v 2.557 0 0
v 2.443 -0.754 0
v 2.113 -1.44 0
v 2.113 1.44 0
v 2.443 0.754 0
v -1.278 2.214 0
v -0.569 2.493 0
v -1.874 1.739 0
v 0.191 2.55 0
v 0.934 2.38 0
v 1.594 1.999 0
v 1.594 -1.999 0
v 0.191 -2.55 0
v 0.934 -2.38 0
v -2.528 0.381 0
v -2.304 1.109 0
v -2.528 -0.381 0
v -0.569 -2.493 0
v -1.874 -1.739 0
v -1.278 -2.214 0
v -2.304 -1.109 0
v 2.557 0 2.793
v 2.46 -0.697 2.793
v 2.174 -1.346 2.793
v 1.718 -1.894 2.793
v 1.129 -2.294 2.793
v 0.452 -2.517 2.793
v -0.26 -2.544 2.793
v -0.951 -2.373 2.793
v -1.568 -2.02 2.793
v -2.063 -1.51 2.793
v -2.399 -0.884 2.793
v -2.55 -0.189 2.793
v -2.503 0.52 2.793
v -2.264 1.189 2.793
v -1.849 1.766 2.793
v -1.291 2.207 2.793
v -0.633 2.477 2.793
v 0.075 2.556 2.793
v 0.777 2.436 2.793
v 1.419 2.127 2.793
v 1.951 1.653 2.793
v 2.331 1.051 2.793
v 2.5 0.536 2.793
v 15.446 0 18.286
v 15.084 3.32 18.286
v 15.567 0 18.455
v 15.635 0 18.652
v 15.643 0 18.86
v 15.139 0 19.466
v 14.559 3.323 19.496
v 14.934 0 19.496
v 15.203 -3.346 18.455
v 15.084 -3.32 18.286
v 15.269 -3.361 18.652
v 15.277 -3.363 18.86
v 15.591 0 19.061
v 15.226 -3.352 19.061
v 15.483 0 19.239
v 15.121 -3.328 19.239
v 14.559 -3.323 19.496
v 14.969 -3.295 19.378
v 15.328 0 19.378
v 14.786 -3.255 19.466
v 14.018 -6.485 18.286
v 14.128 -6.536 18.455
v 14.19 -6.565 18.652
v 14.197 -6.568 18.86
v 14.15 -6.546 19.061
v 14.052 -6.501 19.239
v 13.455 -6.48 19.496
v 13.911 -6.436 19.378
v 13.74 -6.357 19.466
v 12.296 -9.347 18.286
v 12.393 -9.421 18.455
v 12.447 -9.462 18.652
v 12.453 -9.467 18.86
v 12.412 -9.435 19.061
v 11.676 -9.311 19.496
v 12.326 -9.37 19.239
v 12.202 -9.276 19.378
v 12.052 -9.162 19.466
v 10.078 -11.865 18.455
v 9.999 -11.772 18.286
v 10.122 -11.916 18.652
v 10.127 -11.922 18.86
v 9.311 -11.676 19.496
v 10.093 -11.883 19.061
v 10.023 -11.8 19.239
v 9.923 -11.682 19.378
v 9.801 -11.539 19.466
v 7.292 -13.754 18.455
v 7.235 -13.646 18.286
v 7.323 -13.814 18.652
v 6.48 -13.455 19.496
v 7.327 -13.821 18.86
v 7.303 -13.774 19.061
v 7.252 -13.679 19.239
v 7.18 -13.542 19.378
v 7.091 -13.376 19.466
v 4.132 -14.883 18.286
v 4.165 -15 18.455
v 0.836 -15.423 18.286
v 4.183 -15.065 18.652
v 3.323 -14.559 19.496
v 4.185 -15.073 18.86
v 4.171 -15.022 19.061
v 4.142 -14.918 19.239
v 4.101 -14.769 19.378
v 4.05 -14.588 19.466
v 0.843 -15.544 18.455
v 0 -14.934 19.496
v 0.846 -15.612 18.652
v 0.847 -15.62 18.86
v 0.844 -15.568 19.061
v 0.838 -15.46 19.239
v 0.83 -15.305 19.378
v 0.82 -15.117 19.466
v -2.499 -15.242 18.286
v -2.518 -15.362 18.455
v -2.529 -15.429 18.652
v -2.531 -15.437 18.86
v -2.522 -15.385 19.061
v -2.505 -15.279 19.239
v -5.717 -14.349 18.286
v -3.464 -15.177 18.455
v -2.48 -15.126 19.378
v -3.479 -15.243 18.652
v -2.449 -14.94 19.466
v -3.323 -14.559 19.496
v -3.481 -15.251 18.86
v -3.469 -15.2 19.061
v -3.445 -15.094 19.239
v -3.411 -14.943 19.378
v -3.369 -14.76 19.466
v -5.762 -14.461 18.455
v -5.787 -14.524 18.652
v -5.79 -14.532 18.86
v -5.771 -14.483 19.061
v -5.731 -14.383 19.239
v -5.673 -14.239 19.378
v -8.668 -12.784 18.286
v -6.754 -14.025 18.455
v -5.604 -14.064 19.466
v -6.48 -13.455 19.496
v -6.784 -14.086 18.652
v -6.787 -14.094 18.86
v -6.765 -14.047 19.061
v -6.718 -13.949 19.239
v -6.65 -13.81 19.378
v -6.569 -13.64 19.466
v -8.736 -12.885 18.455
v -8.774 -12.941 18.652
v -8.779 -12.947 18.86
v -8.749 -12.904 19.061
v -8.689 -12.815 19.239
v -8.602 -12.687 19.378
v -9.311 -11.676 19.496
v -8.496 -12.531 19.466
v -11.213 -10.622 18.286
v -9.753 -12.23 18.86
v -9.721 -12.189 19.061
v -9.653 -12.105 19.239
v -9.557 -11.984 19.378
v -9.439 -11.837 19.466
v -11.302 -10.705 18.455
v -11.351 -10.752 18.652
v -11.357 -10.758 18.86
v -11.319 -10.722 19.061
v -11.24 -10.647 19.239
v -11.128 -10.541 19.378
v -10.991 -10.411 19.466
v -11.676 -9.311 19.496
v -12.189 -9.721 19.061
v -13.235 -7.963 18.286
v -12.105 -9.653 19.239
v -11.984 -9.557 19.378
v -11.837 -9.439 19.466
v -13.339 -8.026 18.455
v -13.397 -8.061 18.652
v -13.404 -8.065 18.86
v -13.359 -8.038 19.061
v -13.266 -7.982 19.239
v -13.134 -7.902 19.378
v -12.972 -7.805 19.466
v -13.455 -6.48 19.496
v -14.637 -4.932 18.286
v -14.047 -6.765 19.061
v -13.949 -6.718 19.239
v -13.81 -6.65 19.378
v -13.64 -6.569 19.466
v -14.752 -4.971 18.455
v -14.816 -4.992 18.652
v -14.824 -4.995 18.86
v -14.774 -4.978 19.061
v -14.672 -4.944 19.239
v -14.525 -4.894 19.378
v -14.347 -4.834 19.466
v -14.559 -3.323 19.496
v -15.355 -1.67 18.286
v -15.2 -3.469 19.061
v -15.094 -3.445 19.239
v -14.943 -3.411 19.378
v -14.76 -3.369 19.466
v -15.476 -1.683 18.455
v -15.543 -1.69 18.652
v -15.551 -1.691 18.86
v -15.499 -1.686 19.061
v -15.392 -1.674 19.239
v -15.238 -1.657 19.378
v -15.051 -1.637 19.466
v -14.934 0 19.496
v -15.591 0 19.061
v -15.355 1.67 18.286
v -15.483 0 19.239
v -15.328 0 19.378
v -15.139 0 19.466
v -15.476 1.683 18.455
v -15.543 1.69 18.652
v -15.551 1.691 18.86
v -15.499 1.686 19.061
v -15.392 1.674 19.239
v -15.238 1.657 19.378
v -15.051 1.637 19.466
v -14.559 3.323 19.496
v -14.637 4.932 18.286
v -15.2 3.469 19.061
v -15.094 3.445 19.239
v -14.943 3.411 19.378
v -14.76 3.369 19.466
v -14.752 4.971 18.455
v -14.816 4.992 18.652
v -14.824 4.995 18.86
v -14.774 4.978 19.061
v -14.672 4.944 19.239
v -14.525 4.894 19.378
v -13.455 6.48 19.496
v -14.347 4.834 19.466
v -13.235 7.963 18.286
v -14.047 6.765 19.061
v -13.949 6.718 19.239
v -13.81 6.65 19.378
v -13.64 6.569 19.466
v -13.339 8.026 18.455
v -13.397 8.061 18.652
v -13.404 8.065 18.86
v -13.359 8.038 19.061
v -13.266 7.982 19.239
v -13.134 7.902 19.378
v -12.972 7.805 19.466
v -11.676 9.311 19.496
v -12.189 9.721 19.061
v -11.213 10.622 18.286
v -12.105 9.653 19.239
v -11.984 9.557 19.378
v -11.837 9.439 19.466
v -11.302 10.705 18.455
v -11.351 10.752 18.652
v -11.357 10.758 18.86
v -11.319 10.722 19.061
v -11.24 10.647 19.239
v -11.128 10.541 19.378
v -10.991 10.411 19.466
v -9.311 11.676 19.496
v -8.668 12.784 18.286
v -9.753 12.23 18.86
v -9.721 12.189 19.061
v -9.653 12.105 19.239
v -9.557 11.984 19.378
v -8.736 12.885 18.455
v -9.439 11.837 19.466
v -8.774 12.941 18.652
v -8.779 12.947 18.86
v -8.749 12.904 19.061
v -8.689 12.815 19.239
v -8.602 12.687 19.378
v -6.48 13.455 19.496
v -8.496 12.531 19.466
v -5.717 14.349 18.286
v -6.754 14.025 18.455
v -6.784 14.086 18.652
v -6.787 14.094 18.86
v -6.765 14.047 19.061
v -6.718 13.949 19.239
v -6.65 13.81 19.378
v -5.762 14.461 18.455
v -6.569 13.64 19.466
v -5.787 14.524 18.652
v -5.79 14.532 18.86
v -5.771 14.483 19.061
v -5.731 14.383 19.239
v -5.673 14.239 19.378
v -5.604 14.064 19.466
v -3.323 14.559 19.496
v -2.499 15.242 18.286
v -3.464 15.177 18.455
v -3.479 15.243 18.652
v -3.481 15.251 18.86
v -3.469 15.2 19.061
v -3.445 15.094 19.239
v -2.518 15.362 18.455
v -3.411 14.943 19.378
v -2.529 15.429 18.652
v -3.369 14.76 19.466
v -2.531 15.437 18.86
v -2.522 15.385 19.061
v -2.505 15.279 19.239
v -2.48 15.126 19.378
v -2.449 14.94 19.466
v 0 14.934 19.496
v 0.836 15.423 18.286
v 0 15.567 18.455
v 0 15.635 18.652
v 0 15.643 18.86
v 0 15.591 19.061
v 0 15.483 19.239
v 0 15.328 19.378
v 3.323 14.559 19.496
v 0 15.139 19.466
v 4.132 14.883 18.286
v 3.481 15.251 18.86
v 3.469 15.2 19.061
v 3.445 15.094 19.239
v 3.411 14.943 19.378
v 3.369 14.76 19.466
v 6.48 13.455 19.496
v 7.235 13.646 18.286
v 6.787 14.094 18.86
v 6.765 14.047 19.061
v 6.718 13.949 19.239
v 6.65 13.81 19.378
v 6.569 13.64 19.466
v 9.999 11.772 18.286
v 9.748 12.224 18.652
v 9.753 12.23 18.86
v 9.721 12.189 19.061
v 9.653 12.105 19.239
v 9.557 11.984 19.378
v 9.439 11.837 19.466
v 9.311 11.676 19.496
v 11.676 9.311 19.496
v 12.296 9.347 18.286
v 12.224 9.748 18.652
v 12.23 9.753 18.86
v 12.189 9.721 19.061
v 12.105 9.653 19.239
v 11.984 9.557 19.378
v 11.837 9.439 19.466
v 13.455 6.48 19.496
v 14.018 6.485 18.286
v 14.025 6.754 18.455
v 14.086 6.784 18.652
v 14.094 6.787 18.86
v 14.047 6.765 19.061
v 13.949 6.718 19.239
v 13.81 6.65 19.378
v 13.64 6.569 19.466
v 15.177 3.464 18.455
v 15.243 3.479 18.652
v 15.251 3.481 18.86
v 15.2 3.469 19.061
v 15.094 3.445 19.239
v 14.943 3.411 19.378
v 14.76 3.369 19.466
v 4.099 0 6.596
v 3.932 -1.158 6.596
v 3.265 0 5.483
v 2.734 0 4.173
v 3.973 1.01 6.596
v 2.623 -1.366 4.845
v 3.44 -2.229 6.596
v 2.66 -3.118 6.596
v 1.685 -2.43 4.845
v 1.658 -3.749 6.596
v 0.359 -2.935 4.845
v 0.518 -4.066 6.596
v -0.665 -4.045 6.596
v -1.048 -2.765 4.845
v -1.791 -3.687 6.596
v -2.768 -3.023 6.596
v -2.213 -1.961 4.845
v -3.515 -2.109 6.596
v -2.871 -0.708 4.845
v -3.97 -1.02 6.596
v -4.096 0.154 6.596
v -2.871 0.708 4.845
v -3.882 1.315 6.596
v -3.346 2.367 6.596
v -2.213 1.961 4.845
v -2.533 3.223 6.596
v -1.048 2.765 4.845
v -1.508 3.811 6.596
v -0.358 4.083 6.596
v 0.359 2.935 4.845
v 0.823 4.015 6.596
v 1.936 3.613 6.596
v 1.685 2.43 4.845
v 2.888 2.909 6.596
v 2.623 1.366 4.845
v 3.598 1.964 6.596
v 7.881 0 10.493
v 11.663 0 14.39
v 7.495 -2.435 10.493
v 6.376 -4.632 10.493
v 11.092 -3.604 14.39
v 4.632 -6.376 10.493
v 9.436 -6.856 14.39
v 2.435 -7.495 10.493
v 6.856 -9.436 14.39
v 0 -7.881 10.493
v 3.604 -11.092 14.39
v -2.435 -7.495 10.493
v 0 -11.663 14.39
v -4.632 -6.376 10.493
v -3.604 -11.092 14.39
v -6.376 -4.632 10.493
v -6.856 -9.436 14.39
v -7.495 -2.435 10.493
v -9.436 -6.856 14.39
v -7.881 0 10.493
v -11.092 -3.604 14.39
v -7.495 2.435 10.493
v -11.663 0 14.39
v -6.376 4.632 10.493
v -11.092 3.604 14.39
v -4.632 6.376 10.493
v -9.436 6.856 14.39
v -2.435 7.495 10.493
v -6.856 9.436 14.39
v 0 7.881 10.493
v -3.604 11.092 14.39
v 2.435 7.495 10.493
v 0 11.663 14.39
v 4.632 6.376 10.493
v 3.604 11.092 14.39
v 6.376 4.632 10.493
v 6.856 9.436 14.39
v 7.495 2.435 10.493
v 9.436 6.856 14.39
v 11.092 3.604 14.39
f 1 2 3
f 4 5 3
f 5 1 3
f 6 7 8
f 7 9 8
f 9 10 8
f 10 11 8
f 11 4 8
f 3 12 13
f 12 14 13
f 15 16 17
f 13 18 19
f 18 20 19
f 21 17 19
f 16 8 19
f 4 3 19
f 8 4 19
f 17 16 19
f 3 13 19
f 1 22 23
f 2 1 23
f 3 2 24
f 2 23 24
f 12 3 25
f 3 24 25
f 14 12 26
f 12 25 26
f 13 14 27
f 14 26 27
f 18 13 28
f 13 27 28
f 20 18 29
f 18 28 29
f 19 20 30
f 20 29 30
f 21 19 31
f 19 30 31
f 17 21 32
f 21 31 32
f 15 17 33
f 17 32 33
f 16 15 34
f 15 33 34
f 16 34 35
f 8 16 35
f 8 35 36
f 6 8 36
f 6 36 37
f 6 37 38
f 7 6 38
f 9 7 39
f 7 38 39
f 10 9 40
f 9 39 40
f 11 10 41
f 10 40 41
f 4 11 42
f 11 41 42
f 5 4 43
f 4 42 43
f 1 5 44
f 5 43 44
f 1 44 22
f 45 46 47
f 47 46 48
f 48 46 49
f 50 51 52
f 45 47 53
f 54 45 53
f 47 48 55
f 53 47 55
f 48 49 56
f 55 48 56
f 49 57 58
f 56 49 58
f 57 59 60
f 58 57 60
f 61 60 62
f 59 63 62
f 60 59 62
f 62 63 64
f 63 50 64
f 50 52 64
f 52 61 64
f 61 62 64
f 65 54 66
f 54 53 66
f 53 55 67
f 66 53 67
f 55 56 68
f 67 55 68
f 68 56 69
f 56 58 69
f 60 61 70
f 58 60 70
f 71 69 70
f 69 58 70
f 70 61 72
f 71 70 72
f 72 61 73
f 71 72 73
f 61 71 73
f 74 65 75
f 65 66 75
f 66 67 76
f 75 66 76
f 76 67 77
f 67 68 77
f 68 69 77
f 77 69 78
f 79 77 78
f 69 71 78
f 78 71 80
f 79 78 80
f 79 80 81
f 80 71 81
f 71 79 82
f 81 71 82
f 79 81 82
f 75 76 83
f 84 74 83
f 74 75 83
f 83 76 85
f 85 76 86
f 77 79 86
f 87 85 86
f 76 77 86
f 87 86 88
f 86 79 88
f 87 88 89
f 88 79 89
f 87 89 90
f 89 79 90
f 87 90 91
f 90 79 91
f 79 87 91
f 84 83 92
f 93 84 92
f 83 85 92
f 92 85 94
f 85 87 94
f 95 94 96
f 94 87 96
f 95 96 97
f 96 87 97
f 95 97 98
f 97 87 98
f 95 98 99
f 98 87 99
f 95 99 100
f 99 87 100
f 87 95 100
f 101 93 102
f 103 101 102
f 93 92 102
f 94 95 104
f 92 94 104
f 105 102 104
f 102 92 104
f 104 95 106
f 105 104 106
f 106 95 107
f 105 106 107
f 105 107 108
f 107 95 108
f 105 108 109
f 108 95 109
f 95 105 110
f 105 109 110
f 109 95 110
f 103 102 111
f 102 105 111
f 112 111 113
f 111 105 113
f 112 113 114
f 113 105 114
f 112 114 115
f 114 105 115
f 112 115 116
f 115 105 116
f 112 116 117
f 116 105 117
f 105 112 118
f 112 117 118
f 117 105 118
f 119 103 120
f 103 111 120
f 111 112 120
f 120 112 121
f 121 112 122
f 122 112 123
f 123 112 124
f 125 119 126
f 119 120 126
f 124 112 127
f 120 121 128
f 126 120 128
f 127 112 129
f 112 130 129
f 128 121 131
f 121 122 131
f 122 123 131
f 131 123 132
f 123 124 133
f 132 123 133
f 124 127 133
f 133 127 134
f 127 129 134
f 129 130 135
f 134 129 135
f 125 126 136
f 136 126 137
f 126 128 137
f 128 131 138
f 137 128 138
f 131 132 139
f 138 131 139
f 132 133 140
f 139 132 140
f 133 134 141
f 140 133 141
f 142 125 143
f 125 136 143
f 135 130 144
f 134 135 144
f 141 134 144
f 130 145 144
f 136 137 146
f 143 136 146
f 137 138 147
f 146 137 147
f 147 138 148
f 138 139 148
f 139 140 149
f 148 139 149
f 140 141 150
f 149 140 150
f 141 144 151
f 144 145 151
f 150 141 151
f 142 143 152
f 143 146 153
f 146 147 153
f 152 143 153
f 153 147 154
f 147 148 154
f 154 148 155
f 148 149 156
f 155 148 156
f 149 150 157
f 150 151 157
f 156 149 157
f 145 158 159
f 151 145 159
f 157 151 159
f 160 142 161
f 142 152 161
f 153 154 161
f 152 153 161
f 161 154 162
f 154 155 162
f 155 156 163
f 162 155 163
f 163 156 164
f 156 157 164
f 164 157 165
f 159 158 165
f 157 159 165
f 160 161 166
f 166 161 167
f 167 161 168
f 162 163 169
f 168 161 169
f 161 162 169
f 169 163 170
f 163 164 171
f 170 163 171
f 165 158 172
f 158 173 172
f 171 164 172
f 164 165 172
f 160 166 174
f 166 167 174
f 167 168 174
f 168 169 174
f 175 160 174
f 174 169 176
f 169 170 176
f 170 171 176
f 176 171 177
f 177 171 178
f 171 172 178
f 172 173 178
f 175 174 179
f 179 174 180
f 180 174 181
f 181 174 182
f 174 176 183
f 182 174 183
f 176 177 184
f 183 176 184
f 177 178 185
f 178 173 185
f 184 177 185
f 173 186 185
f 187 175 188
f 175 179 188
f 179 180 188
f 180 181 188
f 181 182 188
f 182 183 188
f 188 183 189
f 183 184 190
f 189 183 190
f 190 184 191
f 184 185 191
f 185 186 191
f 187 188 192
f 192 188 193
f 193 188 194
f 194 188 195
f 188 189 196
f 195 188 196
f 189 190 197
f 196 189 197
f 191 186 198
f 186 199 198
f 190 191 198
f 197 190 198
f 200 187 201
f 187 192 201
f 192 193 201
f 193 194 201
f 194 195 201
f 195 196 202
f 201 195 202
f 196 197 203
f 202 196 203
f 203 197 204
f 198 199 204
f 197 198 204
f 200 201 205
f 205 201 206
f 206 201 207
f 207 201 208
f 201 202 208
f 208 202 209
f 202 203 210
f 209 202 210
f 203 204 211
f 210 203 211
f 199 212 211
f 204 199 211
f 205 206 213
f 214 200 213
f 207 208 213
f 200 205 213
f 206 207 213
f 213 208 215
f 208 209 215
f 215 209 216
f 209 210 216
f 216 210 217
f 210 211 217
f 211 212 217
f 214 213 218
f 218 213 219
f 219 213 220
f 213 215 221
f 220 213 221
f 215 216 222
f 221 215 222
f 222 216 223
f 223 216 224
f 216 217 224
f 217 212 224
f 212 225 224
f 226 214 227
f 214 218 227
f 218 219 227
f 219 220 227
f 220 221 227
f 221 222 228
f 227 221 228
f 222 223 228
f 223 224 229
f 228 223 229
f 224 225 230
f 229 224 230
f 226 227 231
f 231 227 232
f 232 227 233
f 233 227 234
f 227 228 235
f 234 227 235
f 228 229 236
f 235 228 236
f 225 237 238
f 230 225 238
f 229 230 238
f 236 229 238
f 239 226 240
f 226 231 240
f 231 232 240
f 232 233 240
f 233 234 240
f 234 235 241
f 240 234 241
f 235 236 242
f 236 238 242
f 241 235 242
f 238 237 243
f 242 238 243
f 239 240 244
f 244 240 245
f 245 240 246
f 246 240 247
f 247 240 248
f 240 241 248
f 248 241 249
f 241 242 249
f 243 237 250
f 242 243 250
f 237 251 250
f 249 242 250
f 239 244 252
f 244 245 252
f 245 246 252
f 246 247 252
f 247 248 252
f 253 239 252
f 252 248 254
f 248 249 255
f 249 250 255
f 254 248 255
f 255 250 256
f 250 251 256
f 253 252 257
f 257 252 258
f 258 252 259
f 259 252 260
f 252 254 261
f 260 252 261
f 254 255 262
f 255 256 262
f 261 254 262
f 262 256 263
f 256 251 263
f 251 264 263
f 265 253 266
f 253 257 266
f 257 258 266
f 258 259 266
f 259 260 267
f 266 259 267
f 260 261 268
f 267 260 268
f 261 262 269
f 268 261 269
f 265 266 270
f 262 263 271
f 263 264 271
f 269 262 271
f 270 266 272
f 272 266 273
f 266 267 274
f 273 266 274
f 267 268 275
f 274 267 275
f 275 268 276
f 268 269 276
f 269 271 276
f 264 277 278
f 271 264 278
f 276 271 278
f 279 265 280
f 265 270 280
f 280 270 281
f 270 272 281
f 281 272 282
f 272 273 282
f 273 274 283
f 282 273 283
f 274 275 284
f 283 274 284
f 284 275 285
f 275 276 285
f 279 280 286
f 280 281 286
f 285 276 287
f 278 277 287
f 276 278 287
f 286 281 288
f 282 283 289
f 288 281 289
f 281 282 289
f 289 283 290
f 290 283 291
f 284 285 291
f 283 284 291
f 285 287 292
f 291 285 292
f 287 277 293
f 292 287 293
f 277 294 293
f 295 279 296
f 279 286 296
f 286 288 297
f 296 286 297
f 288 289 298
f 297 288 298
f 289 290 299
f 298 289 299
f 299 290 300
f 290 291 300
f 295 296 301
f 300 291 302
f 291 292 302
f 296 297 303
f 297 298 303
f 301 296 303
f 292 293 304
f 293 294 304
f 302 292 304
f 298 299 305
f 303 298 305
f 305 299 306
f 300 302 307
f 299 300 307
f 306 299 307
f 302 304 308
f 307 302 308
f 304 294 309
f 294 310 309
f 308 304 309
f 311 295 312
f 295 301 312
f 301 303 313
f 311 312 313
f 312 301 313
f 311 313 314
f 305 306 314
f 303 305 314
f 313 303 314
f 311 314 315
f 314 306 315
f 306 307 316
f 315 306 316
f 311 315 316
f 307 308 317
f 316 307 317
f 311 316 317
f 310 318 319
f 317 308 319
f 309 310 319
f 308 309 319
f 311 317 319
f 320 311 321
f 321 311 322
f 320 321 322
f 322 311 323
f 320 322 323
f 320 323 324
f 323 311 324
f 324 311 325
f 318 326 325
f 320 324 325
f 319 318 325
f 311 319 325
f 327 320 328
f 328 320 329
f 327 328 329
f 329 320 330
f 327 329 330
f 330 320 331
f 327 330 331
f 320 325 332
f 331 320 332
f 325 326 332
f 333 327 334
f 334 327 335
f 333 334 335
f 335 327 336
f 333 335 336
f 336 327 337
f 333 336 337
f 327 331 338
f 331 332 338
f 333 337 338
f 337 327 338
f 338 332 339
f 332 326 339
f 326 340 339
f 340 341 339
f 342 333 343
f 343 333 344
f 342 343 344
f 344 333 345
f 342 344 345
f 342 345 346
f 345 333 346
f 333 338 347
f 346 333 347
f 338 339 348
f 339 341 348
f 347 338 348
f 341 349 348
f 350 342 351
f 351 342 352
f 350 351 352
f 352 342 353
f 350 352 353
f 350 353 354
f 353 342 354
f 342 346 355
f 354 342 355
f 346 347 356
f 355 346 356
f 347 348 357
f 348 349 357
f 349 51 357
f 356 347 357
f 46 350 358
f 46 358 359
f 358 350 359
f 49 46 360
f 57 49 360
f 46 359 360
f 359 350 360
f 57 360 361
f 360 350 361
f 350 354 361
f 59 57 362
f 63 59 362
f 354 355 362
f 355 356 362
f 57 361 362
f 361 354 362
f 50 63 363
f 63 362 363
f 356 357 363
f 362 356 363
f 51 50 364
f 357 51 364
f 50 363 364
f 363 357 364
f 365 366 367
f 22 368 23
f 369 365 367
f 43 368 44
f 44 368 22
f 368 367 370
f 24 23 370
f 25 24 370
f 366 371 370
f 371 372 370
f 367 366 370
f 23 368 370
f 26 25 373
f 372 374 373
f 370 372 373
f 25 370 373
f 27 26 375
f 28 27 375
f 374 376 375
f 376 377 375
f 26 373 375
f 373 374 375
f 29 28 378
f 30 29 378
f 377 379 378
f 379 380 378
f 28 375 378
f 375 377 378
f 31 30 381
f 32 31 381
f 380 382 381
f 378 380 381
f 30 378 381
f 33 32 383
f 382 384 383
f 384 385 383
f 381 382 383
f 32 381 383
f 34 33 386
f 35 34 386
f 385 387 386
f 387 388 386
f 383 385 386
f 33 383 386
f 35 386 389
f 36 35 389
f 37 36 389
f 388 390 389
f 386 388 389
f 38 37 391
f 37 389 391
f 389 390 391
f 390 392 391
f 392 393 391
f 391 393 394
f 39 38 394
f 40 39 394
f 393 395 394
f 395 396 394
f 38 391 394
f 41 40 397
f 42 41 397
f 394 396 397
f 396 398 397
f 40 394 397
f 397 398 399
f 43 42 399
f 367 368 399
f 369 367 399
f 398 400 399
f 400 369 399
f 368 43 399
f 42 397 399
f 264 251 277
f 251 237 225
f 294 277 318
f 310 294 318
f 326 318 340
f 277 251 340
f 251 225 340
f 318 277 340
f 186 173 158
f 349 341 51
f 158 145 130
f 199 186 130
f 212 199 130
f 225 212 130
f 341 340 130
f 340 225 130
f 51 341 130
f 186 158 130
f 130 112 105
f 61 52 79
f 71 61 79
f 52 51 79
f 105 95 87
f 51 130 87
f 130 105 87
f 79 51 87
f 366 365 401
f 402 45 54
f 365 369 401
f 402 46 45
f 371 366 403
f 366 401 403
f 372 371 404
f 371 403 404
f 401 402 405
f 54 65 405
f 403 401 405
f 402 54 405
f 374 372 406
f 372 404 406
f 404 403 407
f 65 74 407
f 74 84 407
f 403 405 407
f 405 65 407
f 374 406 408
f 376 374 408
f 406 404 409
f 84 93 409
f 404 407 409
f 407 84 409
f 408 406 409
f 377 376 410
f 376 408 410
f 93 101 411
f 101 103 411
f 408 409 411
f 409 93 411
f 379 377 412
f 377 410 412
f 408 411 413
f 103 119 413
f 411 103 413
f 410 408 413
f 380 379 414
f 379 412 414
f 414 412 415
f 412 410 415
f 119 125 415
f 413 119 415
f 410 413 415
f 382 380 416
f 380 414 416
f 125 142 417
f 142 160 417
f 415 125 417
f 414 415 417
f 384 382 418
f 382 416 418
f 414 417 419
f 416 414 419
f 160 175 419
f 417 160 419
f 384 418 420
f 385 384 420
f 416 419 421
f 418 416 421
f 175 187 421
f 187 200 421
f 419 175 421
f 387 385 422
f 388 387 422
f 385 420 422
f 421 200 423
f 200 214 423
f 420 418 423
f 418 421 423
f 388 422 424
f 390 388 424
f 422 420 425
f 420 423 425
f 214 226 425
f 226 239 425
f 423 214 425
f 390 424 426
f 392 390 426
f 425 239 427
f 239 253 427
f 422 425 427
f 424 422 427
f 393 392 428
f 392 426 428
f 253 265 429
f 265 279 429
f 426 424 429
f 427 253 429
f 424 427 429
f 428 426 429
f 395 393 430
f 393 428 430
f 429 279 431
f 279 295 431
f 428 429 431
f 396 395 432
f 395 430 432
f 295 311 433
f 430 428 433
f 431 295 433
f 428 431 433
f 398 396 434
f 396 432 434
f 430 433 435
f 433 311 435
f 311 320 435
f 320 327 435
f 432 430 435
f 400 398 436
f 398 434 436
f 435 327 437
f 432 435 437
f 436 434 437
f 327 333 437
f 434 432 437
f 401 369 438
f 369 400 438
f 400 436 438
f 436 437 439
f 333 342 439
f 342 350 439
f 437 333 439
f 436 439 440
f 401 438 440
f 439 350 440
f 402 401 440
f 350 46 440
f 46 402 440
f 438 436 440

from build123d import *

# Parameters (mm, degrees)
F2_R = 0.713231
F3_R = 5.459817


with BuildPart() as f1:
    # F0 (on Front) → F1 (revolve)
    with BuildSketch(Plane.XZ):
        Polygon((0, 19.496445), (0, 0), (2.556912, 0), (2.556912, 5.007284), (16.619919, 19.496445), align=None)
    revolve(axis=Axis((0, 0, 9.748222), (0, 0, -1)))

    # F2
    f2_edges = [f1.edges().sort_by_distance(p)[0] for p in [
        (-16.619919, 0, 19.496445),
    ]]
    fillet(f2_edges, radius=F2_R)

    # F3
    f3_edges = [f1.edges().sort_by_distance(p)[0] for p in [
        (-2.556912, 0, 5.007284),
    ]]
    fillet(f3_edges, radius=F3_R)


solid = f1.part
